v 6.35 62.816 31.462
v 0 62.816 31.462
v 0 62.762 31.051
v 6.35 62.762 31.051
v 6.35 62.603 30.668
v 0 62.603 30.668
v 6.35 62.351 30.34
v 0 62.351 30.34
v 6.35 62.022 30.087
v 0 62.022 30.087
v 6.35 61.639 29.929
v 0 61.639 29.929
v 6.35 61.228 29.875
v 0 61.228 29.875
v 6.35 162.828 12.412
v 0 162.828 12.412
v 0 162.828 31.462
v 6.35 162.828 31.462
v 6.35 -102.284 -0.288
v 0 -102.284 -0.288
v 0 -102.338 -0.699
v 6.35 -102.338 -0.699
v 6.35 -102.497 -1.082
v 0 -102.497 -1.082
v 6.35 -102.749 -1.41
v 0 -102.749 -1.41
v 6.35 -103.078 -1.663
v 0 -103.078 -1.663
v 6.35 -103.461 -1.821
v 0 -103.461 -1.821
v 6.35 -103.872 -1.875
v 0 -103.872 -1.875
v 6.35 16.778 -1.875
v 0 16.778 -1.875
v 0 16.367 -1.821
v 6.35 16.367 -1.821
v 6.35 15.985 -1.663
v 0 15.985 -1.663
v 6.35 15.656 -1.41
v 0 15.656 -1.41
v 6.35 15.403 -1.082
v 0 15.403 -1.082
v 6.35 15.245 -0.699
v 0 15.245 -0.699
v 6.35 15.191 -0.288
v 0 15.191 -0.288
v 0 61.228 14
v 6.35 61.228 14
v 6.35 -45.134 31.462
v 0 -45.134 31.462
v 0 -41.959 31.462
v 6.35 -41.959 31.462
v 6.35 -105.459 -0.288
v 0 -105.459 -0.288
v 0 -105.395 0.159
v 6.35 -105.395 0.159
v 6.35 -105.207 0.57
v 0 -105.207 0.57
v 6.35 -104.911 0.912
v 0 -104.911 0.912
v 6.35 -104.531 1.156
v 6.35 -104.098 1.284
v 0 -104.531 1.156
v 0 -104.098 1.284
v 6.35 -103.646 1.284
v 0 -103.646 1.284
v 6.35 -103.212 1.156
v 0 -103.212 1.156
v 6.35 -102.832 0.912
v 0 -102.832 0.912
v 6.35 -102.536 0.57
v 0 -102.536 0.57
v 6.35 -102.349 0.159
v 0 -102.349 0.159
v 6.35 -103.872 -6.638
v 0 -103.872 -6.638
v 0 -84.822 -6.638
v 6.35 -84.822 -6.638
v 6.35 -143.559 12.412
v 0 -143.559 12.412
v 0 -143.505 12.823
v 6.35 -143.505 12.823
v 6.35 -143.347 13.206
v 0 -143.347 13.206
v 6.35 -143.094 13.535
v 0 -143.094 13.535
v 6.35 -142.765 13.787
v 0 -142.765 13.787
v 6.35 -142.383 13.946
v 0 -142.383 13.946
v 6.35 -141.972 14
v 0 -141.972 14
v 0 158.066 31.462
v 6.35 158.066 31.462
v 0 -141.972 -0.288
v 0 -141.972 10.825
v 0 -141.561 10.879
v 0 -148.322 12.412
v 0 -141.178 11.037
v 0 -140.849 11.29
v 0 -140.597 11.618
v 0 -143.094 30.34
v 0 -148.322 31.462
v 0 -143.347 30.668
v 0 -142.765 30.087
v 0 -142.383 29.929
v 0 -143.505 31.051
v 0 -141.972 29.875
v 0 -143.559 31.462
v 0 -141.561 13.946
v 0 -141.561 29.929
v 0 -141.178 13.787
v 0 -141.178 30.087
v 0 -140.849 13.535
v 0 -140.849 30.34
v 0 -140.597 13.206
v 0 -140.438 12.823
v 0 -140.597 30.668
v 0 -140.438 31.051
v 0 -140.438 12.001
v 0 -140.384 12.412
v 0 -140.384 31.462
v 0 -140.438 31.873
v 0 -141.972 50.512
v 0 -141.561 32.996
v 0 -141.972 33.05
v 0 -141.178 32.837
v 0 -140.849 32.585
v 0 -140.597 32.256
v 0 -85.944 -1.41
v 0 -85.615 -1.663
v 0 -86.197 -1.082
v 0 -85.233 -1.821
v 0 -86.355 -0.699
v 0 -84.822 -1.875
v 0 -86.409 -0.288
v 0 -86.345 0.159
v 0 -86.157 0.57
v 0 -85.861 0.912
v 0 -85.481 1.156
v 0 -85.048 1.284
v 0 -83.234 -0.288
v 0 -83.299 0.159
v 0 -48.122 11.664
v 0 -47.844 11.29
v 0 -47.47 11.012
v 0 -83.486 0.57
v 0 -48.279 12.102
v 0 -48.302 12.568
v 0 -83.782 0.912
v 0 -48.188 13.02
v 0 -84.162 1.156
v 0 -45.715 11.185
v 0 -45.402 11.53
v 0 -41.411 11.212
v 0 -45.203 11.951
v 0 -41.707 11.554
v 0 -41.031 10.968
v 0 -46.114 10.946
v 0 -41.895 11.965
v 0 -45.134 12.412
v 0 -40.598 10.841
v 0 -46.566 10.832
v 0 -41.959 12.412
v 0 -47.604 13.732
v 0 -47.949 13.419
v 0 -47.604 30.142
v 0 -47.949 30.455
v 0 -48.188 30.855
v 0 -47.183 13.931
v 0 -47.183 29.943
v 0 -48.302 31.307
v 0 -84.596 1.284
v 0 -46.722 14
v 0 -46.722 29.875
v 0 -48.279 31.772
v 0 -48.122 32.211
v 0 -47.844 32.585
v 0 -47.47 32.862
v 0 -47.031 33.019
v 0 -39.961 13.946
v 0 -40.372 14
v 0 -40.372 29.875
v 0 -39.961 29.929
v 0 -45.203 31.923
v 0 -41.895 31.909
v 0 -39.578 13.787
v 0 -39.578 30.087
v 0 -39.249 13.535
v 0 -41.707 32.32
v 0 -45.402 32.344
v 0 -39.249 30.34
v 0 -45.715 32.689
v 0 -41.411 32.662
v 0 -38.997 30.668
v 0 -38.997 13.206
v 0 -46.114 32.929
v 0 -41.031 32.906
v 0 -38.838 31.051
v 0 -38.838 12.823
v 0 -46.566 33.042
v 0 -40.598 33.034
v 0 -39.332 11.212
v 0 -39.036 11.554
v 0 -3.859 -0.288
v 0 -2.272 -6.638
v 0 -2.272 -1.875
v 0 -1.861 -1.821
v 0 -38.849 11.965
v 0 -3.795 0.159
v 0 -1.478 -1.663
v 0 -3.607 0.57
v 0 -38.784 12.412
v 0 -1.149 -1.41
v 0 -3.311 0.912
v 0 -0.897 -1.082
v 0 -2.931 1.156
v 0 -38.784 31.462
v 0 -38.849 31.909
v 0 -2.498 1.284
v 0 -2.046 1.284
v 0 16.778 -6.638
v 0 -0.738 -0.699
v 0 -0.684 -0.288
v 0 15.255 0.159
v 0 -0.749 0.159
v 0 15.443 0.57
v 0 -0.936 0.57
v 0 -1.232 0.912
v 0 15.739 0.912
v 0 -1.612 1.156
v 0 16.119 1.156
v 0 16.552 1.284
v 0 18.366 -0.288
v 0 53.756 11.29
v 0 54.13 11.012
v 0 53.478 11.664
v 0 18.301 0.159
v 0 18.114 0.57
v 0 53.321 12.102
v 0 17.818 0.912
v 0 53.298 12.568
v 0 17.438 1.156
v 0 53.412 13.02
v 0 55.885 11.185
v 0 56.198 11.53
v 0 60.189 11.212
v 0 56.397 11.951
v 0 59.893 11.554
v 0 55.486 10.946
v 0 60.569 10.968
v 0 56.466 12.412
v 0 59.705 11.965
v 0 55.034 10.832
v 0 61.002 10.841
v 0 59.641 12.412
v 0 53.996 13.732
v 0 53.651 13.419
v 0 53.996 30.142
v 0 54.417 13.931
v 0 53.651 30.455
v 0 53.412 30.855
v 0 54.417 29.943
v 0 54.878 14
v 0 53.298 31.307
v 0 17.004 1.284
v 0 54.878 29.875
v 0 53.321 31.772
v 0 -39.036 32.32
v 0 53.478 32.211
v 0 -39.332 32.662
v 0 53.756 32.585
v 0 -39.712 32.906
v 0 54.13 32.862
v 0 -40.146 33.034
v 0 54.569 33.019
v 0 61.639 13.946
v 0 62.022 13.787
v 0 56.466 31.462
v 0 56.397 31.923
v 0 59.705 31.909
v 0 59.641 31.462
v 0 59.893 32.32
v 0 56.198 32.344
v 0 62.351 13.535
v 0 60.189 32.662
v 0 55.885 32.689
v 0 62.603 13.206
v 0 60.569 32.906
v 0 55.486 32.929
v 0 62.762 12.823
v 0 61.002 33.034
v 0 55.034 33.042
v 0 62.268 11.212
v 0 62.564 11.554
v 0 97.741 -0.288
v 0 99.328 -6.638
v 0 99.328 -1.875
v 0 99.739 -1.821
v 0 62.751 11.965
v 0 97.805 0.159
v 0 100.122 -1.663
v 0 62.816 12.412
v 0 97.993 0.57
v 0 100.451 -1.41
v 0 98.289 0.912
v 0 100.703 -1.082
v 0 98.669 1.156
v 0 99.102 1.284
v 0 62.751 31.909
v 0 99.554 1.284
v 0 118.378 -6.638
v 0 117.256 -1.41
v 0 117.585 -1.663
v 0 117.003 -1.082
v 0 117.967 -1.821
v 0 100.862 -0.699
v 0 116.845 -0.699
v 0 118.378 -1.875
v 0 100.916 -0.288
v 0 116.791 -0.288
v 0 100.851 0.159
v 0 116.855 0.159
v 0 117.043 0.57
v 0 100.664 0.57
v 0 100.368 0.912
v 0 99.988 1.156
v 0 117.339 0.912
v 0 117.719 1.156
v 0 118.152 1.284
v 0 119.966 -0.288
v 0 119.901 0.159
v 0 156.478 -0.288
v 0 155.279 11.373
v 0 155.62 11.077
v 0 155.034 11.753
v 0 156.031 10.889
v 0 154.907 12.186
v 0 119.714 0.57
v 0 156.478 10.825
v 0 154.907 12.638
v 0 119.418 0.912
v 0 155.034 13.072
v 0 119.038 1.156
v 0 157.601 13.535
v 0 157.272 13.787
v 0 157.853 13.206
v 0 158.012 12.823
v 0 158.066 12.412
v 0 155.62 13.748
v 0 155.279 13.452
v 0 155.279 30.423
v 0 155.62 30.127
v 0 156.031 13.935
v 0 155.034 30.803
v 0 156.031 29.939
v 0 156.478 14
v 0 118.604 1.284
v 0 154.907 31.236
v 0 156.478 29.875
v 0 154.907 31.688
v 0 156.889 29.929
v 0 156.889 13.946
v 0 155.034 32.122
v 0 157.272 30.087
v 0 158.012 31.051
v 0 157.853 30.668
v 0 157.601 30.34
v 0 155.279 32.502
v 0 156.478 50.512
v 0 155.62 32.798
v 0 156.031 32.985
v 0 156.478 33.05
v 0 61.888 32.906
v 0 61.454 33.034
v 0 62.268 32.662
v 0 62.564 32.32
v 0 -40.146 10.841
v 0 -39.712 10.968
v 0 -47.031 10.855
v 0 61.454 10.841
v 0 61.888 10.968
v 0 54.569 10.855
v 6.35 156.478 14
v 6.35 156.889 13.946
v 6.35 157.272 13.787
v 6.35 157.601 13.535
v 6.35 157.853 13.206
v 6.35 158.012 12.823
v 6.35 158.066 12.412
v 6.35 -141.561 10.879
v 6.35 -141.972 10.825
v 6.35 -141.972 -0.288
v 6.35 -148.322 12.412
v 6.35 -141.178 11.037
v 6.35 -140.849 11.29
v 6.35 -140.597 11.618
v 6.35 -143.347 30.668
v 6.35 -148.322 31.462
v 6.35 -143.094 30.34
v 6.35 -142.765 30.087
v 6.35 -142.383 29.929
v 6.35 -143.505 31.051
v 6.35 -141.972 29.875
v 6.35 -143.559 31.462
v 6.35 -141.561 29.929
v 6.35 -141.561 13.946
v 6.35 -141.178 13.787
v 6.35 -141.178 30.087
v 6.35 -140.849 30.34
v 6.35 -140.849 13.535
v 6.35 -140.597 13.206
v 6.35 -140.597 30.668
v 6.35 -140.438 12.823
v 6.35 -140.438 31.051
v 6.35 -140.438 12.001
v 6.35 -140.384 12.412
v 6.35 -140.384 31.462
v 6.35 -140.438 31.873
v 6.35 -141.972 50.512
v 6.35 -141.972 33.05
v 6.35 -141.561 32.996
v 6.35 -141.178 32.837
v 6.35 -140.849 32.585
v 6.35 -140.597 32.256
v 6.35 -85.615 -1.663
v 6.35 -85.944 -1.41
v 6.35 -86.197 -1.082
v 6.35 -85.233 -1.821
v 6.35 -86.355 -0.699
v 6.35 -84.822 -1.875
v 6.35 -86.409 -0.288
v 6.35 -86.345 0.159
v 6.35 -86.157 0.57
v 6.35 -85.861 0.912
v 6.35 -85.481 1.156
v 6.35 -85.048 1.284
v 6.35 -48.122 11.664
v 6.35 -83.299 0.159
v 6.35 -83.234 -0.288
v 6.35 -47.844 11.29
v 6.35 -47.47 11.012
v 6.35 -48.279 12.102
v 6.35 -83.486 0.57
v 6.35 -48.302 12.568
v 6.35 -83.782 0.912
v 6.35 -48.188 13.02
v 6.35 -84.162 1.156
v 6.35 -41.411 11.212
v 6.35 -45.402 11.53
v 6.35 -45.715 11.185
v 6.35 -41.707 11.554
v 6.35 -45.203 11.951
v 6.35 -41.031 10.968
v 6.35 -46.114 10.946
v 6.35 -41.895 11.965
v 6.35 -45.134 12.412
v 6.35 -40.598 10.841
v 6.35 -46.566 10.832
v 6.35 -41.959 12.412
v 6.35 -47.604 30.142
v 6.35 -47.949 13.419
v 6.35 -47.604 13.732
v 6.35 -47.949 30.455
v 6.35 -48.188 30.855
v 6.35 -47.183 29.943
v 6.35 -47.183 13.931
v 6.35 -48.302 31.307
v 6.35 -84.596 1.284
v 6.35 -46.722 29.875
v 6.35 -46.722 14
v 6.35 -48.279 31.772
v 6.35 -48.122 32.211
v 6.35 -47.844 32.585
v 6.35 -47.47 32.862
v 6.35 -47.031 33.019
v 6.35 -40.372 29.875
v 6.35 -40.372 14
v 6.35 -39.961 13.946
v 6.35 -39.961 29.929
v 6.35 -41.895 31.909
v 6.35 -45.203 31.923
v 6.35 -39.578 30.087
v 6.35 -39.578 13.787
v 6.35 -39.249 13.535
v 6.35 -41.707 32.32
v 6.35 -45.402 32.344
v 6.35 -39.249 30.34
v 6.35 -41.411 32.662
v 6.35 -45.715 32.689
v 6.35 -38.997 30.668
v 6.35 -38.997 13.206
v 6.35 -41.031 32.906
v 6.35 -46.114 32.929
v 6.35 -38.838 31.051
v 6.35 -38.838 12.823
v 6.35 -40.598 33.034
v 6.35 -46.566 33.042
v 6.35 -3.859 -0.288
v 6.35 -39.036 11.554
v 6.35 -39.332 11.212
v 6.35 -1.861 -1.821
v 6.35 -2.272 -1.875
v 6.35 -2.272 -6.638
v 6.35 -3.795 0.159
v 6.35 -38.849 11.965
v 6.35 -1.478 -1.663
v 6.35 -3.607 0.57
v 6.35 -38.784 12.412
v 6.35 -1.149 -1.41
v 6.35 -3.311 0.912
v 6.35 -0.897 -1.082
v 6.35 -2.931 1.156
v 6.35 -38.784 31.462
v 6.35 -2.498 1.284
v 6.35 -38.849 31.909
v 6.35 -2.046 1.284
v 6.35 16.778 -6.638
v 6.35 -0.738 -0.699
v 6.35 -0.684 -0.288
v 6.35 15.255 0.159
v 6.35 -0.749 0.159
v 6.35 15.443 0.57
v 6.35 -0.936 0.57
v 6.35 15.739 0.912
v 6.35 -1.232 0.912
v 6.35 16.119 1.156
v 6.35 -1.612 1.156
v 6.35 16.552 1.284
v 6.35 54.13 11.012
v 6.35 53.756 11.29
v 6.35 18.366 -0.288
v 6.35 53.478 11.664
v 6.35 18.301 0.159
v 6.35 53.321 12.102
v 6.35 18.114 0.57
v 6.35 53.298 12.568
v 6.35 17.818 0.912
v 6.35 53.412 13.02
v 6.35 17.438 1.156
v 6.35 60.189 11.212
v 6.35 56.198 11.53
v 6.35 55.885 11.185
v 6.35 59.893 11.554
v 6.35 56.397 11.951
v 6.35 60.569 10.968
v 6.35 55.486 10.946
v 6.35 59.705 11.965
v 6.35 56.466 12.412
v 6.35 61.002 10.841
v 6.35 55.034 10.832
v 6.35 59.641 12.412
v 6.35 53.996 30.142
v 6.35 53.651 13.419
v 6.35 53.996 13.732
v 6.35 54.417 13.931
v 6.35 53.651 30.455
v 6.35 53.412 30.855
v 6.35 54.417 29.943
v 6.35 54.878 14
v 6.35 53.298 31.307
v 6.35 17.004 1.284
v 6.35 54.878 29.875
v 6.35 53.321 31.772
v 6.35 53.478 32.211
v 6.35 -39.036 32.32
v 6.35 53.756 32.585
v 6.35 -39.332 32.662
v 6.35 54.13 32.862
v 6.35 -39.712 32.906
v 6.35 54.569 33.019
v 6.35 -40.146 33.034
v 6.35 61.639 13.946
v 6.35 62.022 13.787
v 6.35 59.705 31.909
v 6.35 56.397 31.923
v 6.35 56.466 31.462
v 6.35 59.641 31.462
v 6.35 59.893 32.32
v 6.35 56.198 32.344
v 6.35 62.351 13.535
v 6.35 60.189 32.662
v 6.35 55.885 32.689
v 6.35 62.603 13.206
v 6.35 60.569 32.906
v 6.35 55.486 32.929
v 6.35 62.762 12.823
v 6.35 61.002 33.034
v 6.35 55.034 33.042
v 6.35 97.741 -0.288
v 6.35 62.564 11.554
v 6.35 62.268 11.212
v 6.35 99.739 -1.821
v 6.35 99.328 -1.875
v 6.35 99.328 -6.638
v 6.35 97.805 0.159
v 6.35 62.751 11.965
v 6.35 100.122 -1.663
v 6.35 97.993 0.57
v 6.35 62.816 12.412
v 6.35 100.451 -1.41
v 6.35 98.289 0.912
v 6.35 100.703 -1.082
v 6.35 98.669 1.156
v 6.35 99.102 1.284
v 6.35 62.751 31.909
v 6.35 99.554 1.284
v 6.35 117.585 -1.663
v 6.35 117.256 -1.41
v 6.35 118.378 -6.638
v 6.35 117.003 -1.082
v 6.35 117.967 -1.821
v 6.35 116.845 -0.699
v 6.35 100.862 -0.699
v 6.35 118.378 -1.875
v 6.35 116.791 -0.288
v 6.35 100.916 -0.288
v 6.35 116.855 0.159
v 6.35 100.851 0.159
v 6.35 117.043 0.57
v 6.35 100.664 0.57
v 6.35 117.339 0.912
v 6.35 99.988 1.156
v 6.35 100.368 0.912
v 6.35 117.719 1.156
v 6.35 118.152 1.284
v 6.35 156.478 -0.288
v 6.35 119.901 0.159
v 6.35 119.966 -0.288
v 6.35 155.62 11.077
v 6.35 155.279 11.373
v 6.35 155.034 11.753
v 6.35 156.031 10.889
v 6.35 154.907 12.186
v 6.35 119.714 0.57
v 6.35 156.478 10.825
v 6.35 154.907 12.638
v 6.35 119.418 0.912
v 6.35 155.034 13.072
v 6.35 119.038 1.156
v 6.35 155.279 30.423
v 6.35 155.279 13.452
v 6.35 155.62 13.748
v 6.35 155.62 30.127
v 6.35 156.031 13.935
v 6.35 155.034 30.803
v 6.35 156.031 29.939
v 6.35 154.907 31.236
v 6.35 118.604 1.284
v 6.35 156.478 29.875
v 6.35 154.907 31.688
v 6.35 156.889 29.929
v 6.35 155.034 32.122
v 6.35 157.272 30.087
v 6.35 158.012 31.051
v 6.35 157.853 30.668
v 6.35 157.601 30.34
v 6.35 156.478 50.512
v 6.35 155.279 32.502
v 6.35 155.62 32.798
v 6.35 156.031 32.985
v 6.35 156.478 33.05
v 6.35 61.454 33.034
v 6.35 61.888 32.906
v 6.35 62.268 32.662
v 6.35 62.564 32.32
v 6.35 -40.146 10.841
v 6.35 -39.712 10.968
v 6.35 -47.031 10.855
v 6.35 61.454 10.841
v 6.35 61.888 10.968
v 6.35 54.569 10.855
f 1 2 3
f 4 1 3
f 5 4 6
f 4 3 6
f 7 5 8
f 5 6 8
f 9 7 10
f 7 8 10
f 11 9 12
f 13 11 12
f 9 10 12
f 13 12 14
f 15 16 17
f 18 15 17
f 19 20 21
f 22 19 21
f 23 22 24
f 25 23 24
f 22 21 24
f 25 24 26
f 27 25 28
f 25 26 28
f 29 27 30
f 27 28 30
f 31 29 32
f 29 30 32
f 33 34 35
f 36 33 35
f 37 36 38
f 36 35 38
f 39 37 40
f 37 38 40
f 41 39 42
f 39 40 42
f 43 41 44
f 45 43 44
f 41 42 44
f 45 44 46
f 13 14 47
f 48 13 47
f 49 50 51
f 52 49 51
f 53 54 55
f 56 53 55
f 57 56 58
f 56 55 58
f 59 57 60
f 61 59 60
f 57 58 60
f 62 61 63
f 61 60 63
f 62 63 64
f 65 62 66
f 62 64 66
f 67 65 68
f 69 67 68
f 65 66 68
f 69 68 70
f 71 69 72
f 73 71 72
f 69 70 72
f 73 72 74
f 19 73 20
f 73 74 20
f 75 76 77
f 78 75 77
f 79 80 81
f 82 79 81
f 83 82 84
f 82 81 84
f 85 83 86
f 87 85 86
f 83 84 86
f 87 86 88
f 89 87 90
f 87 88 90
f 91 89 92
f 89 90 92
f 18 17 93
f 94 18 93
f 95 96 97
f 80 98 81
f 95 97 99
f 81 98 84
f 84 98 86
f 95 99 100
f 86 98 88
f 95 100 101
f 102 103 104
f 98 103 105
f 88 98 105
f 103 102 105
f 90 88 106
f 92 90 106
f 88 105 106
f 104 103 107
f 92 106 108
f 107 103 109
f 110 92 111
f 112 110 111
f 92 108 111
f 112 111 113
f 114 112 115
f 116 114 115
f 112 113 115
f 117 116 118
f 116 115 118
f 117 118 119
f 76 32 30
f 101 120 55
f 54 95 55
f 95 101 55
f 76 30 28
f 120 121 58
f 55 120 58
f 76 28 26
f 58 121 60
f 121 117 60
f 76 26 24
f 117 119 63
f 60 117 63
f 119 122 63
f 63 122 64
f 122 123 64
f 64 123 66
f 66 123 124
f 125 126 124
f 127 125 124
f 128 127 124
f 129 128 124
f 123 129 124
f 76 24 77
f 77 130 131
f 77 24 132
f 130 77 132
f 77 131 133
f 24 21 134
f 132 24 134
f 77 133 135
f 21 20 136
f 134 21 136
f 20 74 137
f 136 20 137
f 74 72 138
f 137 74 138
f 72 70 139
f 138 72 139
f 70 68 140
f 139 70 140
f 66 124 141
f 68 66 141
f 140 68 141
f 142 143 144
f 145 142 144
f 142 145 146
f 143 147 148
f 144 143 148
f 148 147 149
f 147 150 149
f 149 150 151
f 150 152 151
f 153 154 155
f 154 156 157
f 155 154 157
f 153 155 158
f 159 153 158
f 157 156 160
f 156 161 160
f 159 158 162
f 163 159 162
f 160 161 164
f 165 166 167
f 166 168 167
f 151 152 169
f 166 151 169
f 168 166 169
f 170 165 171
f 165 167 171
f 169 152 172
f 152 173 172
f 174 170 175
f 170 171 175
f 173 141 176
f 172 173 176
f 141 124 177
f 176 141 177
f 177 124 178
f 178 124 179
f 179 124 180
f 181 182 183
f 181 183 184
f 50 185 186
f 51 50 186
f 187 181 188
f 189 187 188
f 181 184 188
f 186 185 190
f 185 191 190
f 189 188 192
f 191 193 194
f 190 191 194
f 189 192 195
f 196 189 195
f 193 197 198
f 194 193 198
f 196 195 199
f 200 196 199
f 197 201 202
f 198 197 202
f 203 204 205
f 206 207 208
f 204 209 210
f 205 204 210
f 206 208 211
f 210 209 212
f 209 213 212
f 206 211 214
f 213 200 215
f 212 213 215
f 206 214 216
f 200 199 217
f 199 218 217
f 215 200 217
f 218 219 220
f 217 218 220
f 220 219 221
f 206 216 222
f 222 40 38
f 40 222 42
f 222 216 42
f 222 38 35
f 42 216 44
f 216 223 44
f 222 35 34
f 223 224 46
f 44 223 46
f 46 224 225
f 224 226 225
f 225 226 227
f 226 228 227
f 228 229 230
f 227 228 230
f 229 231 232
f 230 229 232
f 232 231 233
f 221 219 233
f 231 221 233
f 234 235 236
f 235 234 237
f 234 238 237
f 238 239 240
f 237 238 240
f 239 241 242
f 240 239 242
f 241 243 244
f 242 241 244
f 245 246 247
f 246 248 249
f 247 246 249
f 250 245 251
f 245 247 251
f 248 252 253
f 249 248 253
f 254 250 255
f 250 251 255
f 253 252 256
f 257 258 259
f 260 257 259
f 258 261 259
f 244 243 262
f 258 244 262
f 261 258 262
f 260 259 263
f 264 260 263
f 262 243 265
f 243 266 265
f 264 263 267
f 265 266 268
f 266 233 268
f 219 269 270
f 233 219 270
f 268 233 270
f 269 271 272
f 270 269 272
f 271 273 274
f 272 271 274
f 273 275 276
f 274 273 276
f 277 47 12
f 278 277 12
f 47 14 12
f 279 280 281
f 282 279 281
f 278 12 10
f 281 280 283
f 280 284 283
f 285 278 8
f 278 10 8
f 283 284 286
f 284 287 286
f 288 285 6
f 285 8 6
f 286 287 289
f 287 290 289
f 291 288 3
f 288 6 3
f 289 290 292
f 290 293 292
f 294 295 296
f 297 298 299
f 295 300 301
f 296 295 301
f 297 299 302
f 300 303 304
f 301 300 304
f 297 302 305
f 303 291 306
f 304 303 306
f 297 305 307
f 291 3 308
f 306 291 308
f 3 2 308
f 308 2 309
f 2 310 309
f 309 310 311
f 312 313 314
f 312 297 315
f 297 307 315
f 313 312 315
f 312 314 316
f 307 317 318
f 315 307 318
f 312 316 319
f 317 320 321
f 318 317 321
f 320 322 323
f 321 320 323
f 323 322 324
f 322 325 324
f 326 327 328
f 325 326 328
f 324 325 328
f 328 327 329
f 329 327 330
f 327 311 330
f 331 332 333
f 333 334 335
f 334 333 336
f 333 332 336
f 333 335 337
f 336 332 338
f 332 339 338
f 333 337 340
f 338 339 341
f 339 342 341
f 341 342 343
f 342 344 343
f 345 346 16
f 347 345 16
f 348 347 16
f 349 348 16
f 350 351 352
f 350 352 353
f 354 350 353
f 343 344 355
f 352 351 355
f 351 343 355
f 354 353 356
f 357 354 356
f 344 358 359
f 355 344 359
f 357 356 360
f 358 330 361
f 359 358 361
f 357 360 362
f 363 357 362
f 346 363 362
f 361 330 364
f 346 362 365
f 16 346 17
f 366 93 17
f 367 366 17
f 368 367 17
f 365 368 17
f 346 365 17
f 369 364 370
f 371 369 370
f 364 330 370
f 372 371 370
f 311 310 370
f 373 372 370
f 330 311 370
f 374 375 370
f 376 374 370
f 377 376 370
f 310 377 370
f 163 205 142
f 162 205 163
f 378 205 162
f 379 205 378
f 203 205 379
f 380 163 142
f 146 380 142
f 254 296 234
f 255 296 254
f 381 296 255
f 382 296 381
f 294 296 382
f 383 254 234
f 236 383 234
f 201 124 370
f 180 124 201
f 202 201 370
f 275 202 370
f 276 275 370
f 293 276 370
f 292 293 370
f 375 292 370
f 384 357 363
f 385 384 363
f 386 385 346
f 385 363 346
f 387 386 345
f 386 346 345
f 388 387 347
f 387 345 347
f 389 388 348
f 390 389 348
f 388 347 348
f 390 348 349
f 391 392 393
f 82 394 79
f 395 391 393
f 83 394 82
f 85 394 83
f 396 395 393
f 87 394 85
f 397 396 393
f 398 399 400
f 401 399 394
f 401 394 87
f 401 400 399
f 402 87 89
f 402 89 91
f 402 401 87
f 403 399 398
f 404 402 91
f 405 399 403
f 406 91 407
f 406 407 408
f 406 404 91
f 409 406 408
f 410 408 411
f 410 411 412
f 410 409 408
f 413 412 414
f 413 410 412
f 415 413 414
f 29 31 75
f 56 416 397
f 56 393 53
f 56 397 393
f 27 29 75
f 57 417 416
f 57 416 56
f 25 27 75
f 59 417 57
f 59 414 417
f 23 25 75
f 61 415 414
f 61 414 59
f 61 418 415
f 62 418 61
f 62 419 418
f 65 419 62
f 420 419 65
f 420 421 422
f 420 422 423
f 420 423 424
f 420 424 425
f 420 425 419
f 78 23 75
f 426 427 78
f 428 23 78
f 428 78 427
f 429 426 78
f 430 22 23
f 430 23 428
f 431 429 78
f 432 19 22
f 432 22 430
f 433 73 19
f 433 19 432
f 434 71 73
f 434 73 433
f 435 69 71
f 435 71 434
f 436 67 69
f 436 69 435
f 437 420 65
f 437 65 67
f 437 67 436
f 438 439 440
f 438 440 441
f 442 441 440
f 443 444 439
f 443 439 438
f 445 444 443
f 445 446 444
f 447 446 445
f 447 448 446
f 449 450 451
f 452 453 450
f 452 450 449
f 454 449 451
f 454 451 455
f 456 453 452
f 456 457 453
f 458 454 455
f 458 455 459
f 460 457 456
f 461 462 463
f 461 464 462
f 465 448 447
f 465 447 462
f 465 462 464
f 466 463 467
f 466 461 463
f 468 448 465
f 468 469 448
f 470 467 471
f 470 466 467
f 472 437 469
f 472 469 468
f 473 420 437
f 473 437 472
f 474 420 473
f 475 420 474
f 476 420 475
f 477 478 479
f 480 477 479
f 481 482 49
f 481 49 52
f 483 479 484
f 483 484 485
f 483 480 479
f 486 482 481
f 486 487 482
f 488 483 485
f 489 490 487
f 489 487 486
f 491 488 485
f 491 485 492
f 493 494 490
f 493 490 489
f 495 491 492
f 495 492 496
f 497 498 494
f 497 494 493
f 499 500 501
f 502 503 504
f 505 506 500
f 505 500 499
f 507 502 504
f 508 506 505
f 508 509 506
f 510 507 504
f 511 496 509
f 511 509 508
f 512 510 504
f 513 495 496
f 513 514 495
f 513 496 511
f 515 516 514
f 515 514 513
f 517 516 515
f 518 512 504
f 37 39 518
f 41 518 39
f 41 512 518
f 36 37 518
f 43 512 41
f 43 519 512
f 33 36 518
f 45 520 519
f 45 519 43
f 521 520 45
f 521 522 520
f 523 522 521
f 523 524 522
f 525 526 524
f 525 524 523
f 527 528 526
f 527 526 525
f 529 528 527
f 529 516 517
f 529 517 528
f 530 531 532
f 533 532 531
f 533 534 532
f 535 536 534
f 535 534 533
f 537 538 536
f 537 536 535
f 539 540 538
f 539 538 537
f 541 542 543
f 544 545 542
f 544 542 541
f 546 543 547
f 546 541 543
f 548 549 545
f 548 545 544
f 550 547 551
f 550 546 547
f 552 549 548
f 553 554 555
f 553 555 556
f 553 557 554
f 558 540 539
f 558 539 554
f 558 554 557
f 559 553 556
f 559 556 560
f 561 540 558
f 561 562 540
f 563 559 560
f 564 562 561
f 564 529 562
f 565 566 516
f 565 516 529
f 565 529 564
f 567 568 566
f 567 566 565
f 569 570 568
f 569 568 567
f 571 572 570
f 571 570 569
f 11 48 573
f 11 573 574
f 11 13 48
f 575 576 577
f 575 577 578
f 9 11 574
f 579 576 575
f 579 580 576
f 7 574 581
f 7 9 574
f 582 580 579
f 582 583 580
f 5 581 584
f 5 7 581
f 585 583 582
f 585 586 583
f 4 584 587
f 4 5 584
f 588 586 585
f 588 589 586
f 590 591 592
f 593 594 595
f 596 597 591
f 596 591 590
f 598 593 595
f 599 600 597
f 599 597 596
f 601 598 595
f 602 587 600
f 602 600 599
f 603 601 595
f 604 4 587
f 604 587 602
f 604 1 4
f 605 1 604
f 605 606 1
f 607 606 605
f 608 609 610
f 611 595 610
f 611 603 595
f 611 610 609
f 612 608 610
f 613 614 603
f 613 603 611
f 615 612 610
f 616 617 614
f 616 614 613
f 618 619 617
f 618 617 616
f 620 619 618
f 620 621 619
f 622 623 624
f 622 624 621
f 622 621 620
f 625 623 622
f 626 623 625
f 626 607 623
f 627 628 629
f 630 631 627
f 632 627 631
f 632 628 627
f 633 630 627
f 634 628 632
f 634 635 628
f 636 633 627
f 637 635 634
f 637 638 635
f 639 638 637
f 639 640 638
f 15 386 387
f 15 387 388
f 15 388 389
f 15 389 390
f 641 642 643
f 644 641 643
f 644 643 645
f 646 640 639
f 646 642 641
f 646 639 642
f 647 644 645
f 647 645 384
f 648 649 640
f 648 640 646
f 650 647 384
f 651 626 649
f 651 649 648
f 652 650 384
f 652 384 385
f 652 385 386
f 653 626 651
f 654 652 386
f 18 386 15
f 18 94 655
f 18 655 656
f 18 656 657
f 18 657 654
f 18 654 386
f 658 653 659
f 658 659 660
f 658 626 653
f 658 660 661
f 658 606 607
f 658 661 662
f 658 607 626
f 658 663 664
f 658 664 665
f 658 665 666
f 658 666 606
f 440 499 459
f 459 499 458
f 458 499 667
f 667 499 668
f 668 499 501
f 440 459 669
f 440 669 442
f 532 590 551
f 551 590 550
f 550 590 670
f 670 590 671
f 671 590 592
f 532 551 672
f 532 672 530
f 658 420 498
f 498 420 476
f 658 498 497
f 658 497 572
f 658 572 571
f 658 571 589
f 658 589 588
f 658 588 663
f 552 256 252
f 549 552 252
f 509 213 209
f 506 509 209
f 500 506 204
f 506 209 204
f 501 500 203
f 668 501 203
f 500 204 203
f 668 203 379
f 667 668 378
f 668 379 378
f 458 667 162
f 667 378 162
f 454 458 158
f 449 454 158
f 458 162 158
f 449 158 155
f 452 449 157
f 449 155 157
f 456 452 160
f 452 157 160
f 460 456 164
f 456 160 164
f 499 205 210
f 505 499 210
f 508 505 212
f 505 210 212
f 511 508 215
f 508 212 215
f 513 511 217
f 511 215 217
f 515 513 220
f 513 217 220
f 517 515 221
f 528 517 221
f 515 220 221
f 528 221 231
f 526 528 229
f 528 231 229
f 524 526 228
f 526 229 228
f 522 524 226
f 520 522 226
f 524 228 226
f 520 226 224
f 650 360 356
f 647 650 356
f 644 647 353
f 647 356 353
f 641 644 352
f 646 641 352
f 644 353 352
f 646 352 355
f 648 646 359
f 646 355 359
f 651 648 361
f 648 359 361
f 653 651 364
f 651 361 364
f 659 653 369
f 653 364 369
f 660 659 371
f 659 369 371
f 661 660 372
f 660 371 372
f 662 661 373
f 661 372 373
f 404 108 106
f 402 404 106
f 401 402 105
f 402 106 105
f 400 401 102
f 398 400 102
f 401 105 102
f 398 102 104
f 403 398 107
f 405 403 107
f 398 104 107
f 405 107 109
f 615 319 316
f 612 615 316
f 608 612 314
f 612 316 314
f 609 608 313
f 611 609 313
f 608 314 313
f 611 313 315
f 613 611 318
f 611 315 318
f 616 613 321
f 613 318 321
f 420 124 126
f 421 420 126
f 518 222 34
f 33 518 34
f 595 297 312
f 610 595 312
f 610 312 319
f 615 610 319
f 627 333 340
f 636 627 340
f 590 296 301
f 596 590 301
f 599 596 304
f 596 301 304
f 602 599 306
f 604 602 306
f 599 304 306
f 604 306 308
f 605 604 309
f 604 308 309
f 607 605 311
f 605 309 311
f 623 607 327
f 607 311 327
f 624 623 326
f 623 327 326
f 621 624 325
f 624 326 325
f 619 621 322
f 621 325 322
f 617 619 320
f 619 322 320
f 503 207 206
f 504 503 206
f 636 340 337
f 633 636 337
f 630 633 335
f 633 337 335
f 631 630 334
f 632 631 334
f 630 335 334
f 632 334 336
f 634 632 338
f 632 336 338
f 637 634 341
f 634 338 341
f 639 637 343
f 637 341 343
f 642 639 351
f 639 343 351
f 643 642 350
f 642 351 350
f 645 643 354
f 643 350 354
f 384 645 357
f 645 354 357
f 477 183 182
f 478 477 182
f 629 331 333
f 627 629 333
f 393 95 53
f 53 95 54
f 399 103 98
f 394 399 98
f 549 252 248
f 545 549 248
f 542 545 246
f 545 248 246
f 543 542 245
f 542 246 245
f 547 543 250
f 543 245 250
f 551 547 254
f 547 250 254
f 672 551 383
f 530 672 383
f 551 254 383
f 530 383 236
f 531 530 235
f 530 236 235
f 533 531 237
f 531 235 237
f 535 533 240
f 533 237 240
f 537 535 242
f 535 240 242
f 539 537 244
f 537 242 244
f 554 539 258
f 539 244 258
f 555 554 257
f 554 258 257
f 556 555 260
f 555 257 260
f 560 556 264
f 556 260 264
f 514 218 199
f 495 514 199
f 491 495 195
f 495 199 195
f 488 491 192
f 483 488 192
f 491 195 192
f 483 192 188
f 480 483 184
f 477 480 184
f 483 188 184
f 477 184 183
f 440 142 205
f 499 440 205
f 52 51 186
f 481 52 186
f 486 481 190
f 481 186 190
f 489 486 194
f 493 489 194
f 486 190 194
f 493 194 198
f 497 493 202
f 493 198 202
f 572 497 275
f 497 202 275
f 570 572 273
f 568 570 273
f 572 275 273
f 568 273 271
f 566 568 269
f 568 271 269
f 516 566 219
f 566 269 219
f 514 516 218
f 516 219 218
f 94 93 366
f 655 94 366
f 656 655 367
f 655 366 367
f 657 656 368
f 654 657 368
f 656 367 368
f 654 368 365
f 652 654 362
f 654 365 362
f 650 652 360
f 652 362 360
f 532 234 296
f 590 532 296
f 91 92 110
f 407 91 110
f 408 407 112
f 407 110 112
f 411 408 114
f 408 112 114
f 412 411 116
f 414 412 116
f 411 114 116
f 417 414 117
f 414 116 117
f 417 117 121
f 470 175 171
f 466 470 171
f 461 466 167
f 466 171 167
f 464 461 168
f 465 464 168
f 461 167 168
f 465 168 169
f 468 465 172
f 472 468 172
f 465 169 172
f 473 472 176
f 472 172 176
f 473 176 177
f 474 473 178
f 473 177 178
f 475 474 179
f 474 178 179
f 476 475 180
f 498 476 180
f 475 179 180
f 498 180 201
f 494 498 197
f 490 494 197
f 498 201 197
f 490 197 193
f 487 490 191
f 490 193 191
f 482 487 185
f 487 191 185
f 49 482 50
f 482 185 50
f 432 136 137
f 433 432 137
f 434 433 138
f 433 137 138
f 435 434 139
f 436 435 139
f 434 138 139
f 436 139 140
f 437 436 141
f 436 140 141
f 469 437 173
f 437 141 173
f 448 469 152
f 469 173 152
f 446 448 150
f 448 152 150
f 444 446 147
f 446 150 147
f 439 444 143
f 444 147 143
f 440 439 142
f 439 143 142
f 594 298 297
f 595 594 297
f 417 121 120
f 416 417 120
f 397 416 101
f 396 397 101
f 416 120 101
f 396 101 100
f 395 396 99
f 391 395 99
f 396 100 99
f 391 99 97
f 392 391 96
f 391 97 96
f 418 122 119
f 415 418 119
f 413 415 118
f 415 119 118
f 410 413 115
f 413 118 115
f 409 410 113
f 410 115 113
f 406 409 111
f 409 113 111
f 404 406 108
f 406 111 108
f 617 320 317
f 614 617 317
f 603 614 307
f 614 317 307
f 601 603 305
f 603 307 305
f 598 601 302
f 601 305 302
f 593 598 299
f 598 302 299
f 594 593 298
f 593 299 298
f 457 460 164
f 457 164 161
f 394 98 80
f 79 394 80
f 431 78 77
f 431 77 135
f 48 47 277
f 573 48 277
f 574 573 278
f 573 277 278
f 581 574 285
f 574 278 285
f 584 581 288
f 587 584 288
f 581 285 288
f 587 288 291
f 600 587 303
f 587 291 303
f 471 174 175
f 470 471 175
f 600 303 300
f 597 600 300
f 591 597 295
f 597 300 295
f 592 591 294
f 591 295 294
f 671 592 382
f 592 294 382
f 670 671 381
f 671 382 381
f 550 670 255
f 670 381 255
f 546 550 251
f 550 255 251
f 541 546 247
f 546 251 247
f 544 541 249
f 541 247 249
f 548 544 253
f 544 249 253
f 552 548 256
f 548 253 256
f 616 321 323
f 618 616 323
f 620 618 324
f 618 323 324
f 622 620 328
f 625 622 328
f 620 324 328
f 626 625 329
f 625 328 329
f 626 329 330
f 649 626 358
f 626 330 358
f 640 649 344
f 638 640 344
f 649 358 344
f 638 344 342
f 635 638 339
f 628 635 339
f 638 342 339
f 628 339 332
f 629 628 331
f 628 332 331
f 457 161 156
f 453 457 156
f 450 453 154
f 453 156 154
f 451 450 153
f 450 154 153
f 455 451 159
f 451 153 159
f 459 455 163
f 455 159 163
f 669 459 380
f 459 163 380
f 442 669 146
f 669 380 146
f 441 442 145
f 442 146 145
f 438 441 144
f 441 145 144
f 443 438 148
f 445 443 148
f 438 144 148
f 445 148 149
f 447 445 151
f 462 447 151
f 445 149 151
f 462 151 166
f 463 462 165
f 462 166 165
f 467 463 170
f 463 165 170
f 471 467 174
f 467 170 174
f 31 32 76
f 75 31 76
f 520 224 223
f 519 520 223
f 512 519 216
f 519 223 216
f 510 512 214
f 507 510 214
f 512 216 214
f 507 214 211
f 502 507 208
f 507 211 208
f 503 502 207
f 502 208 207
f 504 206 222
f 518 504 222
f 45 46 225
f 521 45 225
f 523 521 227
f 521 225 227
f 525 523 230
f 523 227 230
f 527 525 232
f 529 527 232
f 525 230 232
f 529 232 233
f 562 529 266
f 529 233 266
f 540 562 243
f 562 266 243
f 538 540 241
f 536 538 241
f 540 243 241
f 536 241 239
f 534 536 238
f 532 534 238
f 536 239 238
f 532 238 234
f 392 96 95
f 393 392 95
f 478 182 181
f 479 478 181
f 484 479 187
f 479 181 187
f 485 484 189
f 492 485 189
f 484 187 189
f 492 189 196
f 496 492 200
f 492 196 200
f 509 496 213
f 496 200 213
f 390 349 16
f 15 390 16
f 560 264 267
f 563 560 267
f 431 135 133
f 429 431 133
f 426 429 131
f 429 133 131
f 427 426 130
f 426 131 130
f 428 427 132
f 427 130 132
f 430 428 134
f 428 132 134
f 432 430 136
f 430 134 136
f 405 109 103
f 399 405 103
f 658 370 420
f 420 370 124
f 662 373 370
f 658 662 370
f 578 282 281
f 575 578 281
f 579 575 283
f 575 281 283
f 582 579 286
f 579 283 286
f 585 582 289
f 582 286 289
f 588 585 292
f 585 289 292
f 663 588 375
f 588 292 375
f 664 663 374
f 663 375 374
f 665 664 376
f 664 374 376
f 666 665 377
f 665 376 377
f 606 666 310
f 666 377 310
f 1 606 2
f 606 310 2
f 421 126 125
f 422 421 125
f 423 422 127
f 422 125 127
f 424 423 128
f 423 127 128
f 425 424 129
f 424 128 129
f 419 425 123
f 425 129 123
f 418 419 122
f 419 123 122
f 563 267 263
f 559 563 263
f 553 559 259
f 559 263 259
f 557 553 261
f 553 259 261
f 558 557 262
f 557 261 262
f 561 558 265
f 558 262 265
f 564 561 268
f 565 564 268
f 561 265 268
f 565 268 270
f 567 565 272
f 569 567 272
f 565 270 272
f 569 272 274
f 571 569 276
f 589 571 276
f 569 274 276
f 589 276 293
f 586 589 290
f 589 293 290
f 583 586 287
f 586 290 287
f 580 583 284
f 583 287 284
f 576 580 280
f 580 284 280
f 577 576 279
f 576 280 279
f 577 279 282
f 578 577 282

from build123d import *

# Parameters (mm, degrees)
F1_DEPTH = 6.35


with BuildPart() as f1:
    # F0 (on Right) → F1 (new body)
    with BuildSketch(Plane.YZ):
        with BuildLine():
            ThreePointArc((-141.971718, 29.874661), (-143.09425, 30.339629), (-143.559218, 31.462161))
            Line((-143.559218, 31.462161), (-148.321718, 31.462161))
            Line((-148.321718, 31.462161), (-148.321718, 12.412161))
            Line((-148.321718, 12.412161), (-143.559218, 12.412161))
            ThreePointArc((-143.559218, 12.412161), (-143.09425, 13.534693), (-141.971718, 13.999661))
            Line((-141.971718, 13.999661), (-141.971718, 29.874661))
        make_face()
        with BuildLine():
            Line((156.478282, 50.512161), (-141.971718, 50.512161))
            Line((-141.971718, 50.512161), (-141.971718, 33.049661))
            ThreePointArc((-141.971718, 33.049661), (-140.849186, 32.584693), (-140.384218, 31.462161))
            ThreePointArc((-140.384218, 31.462161), (-140.849186, 30.339629), (-141.971718, 29.874661))
            Line((-141.971718, 29.874661), (-141.971718, 13.999661))
            ThreePointArc((-141.971718, 13.999661), (-140.849186, 13.534693), (-140.384218, 12.412161))
            ThreePointArc((-140.384218, 12.412161), (-140.849186, 11.289629), (-141.971718, 10.824661))
            Line((-141.971718, 10.824661), (-141.971718, -0.287839))
            Line((-141.971718, -0.287839), (-105.459218, -0.287839))
            ThreePointArc((-105.459218, -0.287839), (-103.871718, 1.299661), (-102.284218, -0.287839))
            Line((-102.284218, -0.287839), (-86.409218, -0.287839))
            ThreePointArc((-86.409218, -0.287839), (-84.821718, 1.299661), (-83.234218, -0.287839))
            Line((-83.234218, -0.287839), (-3.859218, -0.287839))
            ThreePointArc((-3.859218, -0.287839), (-2.271718, 1.299661), (-0.684218, -0.287839))
            Line((-0.684218, -0.287839), (15.190782, -0.287839))
            ThreePointArc((15.190782, -0.287839), (16.778282, 1.299661), (18.365782, -0.287839))
            Line((18.365782, -0.287839), (97.740782, -0.287839))
            ThreePointArc((97.740782, -0.287839), (99.328282, 1.299661), (100.915782, -0.287839))
            Line((100.915782, -0.287839), (116.790782, -0.287839))
            ThreePointArc((116.790782, -0.287839), (118.378282, 1.299661), (119.965782, -0.287839))
            Line((119.965782, -0.287839), (156.478282, -0.287839))
            Line((156.478282, -0.287839), (156.478282, 10.824661))
            ThreePointArc((156.478282, 10.824661), (154.890782, 12.412161), (156.478282, 13.999661))
            Line((156.478282, 13.999661), (156.478282, 29.874661))
            ThreePointArc((156.478282, 29.874661), (154.890782, 31.462161), (156.478282, 33.049661))
            Line((156.478282, 33.049661), (156.478282, 50.512161))
        make_face()
        with BuildLine():
            ThreePointArc((-46.721718, 29.874661), (-47.84425, 32.584693), (-45.134218, 31.462161))
            Line((-45.134218, 31.462161), (-41.959218, 31.462161))
            ThreePointArc((-41.959218, 31.462161), (-40.371718, 33.049661), (-38.784218, 31.462161))
            ThreePointArc((-38.784218, 31.462161), (-39.249186, 30.339629), (-40.371718, 29.874661))
            Line((-40.371718, 29.874661), (-40.371718, 13.999661))
            ThreePointArc((-40.371718, 13.999661), (-39.249186, 13.534693), (-38.784218, 12.412161))
            ThreePointArc((-38.784218, 12.412161), (-40.371718, 10.824661), (-41.959218, 12.412161))
            Line((-41.959218, 12.412161), (-45.134218, 12.412161))
            ThreePointArc((-45.134218, 12.412161), (-47.84425, 11.289629), (-46.721718, 13.999661))
            Line((-46.721718, 13.999661), (-46.721718, 29.874661))
        make_face(mode=Mode.SUBTRACT)
        with BuildLine():
            ThreePointArc((54.878282, 29.874661), (53.75575, 32.584693), (56.465782, 31.462161))
            Line((56.465782, 31.462161), (59.640782, 31.462161))
            ThreePointArc((59.640782, 31.462161), (61.228282, 33.049661), (62.815782, 31.462161))
            ThreePointArc((62.815782, 31.462161), (62.350814, 30.339629), (61.228282, 29.874661))
            Line((61.228282, 29.874661), (61.228282, 13.999661))
            ThreePointArc((61.228282, 13.999661), (62.350814, 13.534693), (62.815782, 12.412161))
            ThreePointArc((62.815782, 12.412161), (61.228282, 10.824661), (59.640782, 12.412161))
            Line((59.640782, 12.412161), (56.465782, 12.412161))
            ThreePointArc((56.465782, 12.412161), (53.75575, 11.289629), (54.878282, 13.999661))
            Line((54.878282, 13.999661), (54.878282, 29.874661))
        make_face(mode=Mode.SUBTRACT)
        with BuildLine():
            Line((-86.409218, -0.287839), (-102.284218, -0.287839))
            ThreePointArc((-102.284218, -0.287839), (-102.749186, -1.410371), (-103.871718, -1.875339))
            Line((-103.871718, -1.875339), (-103.871718, -6.637839))
            Line((-103.871718, -6.637839), (-84.821718, -6.637839))
            Line((-84.821718, -6.637839), (-84.821718, -1.875339))
            ThreePointArc((-84.821718, -1.875339), (-85.94425, -1.410371), (-86.409218, -0.287839))
        make_face()
        with BuildLine():
            ThreePointArc((16.778282, -1.875339), (15.65575, -1.410371), (15.190782, -0.287839))
            Line((15.190782, -0.287839), (-0.684218, -0.287839))
            ThreePointArc((-0.684218, -0.287839), (-1.149186, -1.410371), (-2.271718, -1.875339))
            Line((-2.271718, -1.875339), (-2.271718, -6.637839))
            Line((-2.271718, -6.637839), (16.778282, -6.637839))
            Line((16.778282, -6.637839), (16.778282, -1.875339))
        make_face()
        with BuildLine():
            ThreePointArc((118.378282, -1.875339), (117.25575, -1.410371), (116.790782, -0.287839))
            Line((116.790782, -0.287839), (100.915782, -0.287839))
            ThreePointArc((100.915782, -0.287839), (100.450814, -1.410371), (99.328282, -1.875339))
            Line((99.328282, -1.875339), (99.328282, -6.637839))
            Line((99.328282, -6.637839), (118.378282, -6.637839))
            Line((118.378282, -6.637839), (118.378282, -1.875339))
        make_face()
        with BuildLine():
            Line((162.828282, 31.462161), (158.065782, 31.462161))
            ThreePointArc((158.065782, 31.462161), (157.600814, 30.339629), (156.478282, 29.874661))
            Line((156.478282, 29.874661), (156.478282, 13.999661))
            ThreePointArc((156.478282, 13.999661), (157.600814, 13.534693), (158.065782, 12.412161))
            Line((158.065782, 12.412161), (162.828282, 12.412161))
            Line((162.828282, 12.412161), (162.828282, 31.462161))
        make_face()
    extrude(amount=F1_DEPTH)


solid = f1.part
